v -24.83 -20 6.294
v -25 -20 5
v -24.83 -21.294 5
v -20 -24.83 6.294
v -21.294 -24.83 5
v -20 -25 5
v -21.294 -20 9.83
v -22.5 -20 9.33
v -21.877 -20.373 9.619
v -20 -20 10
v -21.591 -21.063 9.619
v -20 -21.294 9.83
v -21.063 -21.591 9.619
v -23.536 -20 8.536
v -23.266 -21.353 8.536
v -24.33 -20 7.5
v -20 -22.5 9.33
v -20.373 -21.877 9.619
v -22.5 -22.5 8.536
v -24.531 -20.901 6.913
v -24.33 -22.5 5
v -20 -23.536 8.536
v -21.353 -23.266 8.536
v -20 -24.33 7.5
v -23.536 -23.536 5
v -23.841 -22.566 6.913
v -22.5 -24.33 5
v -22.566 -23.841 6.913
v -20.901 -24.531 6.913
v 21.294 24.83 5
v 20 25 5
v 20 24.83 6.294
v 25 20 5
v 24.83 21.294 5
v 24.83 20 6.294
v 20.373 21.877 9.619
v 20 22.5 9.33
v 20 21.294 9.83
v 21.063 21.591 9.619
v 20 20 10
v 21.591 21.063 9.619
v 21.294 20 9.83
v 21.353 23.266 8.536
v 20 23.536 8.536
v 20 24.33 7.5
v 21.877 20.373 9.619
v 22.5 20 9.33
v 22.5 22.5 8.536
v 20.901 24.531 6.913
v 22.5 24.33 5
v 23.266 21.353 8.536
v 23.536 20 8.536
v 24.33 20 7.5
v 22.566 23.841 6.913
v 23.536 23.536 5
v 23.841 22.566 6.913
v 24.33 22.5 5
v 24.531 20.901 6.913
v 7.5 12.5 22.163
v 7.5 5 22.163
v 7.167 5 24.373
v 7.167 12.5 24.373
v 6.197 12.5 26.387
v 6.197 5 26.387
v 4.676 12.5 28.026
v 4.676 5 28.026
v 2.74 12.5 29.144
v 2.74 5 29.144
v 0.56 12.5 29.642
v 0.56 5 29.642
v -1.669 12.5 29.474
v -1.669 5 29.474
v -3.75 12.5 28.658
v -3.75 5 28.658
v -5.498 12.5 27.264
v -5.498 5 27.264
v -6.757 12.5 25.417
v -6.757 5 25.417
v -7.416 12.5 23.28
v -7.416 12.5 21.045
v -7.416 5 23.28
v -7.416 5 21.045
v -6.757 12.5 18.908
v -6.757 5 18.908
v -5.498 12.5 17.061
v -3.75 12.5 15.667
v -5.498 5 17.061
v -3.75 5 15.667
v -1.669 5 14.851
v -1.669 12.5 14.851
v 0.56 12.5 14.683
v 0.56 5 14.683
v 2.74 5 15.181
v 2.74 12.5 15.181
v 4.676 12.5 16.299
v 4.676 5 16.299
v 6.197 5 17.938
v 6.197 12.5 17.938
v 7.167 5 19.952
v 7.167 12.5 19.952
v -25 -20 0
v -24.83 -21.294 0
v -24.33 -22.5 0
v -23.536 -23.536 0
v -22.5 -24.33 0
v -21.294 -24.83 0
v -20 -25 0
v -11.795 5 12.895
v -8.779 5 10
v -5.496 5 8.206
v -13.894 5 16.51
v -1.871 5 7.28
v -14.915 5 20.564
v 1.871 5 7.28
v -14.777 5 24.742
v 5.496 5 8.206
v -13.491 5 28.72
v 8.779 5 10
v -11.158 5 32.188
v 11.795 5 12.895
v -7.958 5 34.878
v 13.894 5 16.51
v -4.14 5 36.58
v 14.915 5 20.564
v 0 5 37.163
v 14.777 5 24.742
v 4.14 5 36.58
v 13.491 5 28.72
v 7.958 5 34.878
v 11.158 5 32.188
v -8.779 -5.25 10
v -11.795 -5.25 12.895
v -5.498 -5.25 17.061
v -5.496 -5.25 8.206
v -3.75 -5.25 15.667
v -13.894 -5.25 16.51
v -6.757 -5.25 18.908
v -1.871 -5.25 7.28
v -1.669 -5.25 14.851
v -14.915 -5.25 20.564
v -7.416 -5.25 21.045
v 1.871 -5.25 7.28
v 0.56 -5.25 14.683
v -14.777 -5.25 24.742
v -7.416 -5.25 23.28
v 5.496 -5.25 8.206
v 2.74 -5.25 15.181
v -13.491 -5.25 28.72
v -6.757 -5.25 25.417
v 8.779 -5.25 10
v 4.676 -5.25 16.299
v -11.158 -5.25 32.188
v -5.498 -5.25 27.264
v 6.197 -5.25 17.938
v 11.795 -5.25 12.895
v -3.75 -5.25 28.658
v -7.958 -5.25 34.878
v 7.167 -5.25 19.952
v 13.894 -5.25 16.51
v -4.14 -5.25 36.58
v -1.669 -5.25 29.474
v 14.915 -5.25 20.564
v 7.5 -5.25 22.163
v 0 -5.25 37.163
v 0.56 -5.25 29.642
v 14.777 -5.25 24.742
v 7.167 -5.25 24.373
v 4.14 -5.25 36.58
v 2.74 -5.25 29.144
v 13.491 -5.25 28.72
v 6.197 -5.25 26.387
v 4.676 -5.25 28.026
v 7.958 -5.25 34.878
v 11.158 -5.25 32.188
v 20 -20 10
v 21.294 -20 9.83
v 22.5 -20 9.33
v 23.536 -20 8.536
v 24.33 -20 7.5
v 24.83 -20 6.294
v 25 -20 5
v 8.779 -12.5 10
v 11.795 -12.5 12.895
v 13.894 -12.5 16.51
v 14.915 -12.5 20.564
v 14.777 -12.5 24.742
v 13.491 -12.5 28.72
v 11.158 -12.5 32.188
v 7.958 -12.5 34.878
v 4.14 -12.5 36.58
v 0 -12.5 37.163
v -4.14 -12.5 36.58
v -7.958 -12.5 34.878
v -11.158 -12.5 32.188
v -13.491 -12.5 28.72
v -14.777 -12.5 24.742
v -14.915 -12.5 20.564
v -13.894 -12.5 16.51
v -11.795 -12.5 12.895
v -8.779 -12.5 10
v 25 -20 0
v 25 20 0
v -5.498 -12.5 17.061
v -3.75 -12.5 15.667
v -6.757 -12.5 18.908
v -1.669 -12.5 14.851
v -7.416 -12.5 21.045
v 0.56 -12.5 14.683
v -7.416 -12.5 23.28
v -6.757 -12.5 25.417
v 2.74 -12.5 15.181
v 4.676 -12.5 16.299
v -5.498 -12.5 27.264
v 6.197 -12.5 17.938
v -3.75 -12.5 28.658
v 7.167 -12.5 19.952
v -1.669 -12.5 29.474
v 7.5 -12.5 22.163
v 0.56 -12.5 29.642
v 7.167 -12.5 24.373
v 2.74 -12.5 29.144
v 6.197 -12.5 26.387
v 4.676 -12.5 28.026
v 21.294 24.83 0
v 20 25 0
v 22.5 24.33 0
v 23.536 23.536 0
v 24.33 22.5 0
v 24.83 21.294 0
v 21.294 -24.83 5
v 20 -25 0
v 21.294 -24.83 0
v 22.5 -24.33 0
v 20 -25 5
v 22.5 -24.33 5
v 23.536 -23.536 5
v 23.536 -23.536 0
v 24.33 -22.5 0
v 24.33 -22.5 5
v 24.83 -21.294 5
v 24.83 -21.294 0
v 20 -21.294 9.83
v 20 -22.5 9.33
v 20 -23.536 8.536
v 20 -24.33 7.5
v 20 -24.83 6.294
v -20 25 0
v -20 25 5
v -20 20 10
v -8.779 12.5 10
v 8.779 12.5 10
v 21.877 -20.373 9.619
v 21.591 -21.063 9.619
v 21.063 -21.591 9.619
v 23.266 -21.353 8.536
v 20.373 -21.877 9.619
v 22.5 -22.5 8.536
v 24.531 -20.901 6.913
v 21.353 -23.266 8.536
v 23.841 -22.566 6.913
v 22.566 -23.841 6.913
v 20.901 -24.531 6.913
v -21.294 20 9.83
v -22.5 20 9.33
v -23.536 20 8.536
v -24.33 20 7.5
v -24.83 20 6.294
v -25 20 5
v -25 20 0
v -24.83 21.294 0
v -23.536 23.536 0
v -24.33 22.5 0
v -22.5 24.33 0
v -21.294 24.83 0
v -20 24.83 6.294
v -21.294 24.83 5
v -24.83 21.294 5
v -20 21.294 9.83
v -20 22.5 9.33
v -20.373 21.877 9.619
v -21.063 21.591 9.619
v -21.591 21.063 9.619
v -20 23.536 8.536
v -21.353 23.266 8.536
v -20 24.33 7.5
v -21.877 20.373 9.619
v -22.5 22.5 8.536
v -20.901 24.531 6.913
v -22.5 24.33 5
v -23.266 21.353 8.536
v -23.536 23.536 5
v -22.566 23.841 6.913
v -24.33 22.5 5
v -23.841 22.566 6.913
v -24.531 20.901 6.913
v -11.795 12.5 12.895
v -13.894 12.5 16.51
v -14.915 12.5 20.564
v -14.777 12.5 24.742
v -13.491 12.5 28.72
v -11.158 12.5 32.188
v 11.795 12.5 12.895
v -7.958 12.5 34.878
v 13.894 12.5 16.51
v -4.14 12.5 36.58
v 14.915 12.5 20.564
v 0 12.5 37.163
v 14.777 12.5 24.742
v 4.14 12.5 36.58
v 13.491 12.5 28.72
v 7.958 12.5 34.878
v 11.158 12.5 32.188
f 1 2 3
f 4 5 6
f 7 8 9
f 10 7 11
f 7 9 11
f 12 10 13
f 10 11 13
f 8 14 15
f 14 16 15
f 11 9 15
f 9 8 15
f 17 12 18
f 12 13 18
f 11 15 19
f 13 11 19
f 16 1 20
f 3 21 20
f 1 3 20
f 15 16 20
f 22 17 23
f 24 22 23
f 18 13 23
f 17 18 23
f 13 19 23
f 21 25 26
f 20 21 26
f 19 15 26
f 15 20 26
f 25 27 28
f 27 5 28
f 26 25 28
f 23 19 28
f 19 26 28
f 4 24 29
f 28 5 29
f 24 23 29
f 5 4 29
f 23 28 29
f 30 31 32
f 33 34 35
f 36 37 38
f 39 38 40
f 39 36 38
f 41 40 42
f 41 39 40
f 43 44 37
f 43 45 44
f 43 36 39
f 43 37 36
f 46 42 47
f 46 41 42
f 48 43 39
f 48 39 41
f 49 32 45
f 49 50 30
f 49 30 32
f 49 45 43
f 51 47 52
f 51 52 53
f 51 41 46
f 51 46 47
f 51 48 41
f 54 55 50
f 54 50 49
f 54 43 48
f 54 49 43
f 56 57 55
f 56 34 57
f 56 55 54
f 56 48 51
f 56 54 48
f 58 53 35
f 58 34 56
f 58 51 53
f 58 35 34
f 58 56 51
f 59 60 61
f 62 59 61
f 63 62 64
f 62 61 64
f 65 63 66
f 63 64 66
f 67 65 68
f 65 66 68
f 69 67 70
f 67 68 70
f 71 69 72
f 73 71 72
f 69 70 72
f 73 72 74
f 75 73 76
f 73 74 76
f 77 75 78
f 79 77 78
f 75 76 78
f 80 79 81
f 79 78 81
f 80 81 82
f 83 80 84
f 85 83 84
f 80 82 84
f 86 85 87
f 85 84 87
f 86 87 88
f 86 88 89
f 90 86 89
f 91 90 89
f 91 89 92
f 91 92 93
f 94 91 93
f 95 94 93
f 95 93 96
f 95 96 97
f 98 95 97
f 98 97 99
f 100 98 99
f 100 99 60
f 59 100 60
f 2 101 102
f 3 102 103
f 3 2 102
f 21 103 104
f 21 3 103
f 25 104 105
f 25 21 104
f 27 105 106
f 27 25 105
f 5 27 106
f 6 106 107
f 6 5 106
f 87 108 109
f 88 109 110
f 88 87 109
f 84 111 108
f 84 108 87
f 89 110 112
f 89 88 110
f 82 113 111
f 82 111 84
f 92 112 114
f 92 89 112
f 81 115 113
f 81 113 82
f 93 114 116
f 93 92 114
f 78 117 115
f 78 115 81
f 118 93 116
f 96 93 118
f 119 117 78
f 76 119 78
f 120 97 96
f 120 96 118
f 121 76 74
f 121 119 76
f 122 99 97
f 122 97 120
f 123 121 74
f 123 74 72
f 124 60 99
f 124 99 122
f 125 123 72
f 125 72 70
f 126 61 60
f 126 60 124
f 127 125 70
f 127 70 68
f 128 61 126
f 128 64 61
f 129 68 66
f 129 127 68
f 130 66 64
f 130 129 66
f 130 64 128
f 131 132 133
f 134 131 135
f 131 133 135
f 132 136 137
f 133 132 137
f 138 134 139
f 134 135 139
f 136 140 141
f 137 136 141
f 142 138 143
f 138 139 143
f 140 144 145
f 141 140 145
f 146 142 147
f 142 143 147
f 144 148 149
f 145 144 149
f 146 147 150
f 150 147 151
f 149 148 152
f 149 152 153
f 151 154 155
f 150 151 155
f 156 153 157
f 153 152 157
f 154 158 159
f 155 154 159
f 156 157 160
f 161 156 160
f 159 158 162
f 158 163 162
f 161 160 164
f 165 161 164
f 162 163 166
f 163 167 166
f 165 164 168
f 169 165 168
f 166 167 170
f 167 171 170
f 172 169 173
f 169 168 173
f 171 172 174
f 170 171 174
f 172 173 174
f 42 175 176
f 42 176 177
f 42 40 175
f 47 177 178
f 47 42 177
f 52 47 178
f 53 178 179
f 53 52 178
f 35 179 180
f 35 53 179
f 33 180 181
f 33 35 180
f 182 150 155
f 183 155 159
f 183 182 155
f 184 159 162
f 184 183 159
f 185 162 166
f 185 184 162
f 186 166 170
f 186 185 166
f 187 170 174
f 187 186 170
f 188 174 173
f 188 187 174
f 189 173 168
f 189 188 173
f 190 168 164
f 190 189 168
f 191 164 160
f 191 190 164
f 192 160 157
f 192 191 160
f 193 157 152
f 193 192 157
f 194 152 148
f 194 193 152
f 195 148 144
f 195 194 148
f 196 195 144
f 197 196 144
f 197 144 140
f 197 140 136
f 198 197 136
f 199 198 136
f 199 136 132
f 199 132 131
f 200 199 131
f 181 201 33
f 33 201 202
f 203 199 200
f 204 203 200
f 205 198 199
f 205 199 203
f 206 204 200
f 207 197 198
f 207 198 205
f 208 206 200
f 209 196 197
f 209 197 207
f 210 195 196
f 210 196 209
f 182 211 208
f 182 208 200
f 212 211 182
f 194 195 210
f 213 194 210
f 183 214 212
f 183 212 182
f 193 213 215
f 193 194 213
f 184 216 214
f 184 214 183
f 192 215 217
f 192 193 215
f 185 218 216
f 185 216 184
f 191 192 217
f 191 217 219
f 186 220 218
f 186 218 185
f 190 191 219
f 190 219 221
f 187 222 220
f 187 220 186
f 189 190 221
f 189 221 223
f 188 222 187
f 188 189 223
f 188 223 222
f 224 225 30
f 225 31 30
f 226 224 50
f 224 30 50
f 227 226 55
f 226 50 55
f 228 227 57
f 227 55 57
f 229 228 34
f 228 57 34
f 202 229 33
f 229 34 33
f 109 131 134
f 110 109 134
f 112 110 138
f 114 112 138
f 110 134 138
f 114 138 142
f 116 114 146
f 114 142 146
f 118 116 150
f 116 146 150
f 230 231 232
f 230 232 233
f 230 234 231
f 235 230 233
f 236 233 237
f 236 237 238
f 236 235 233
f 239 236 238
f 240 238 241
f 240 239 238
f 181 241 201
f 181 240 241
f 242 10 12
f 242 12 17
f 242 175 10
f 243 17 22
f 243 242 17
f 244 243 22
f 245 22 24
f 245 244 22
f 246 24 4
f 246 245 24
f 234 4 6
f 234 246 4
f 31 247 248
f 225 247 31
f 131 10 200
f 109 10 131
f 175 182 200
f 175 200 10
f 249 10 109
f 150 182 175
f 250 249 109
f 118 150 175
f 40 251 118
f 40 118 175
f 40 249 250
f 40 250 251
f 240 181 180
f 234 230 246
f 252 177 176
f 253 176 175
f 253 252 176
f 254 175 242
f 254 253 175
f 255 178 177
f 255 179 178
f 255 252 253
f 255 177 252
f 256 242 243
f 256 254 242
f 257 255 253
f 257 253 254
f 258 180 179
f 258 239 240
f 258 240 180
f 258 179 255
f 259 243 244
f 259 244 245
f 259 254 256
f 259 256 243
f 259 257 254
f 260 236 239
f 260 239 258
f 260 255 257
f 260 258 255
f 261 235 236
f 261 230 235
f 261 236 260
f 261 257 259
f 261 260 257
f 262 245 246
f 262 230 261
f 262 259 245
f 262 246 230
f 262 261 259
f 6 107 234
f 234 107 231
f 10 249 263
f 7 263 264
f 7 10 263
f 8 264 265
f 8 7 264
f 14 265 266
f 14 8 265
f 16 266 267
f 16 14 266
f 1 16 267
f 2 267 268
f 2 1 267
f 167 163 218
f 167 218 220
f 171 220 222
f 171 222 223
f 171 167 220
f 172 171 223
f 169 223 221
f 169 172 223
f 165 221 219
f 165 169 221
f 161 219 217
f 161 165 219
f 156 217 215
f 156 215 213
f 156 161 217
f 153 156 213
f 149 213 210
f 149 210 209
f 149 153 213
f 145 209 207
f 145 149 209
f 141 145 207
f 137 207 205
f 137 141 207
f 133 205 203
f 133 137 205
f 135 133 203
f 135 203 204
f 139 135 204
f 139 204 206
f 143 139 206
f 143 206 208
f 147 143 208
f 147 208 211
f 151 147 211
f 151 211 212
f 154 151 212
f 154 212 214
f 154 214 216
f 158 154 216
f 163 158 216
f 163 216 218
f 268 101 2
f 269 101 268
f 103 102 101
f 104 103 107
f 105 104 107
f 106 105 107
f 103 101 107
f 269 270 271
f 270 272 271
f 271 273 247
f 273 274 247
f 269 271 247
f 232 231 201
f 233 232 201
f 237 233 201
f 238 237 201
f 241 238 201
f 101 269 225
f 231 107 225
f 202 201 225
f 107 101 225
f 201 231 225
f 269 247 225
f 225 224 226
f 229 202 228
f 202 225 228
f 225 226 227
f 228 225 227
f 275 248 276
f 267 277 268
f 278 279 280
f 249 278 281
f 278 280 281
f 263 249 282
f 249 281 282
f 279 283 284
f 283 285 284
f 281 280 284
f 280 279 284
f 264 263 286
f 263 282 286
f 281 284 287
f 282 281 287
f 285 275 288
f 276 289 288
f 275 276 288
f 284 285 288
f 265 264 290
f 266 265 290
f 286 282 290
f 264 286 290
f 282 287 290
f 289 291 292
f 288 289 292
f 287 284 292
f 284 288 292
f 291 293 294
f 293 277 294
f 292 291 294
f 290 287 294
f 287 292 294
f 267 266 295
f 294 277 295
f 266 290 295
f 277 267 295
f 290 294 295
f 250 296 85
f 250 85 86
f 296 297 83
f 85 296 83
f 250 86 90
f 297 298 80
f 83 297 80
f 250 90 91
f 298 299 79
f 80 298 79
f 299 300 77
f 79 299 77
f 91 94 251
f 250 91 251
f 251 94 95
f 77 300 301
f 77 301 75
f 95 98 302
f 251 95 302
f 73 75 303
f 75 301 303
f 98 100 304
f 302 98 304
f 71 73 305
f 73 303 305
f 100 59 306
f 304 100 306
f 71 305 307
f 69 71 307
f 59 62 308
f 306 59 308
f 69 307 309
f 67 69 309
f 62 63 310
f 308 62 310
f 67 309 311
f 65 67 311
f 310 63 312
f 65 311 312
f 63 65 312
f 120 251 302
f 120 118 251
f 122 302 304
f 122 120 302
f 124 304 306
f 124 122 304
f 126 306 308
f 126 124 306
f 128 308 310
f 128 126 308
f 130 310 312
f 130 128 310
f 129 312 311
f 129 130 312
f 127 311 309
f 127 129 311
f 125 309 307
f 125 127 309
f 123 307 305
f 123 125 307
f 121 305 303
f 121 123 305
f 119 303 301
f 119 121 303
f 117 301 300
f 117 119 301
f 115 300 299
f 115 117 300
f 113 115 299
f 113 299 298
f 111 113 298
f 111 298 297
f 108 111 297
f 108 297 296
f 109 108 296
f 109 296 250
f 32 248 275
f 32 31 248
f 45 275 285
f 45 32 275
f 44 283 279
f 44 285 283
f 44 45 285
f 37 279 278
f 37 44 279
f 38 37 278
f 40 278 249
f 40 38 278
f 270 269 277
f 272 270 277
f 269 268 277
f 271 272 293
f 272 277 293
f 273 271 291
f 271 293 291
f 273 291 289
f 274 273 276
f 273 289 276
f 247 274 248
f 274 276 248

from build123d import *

# Parameters (mm, degrees)
F0_W          = 50
F0_H          = 50
F1_DEPTH      = 10
F2_R          = 5
F3_R          = 5
F4_R          = 15
F4_R_2        = 7.5
F5_DEPTH      = 12.5
F5_DEPTH_BACK = 12.5
F6_DEPTH      = 5
F6_DEPTH_BACK = 5.25


with BuildPart() as f1:
    # F0 (on Top) → F1 (new body)
    with BuildSketch(Plane.XY):
        Rectangle(F0_W, F0_H)
    extrude(amount=F1_DEPTH)

    # F2
    f2_edges = [f1.edges().sort_by_distance(p)[0] for p in [
        (-25, -25, 5),
    ]]
    fillet(f2_edges, radius=F2_R)

    # F3
    f3_edges = [f1.edges().sort_by_distance(p)[0] for p in [
        (25, -25, 5),
        (-25, 25, 5),
        (25, 25, 5),
        (0, 25, 10),
        (25, 0, 10),
        (2.5, -25, 10),
        (-25, 2.5, 10),
    ]]
    fillet(f3_edges, radius=F3_R)

    # F4 (on Front) → F5 (join, two sides)
    with BuildSketch(Plane.XZ) as f5_sk:
        with Locations((0, 22.1625054122)):
            Circle(F4_R)
        with Locations((0, 22.1625054122)):
            Circle(F4_R_2, mode=Mode.SUBTRACT)
    extrude(amount=F5_DEPTH)
    extrude(f5_sk.sketch, amount=-F5_DEPTH_BACK)

    # F4 (on Front) → F6 (cut, two sides)
    with BuildSketch(Plane.XZ) as f6_sk:
        with Locations((0, 22.1625054122)):
            Circle(F4_R)
        with Locations((0, 22.1625054122)):
            Circle(F4_R_2, mode=Mode.SUBTRACT)
    extrude(amount=-F6_DEPTH, mode=Mode.SUBTRACT)
    extrude(f6_sk.sketch, amount=F6_DEPTH_BACK, mode=Mode.SUBTRACT)


solid = f1.part
